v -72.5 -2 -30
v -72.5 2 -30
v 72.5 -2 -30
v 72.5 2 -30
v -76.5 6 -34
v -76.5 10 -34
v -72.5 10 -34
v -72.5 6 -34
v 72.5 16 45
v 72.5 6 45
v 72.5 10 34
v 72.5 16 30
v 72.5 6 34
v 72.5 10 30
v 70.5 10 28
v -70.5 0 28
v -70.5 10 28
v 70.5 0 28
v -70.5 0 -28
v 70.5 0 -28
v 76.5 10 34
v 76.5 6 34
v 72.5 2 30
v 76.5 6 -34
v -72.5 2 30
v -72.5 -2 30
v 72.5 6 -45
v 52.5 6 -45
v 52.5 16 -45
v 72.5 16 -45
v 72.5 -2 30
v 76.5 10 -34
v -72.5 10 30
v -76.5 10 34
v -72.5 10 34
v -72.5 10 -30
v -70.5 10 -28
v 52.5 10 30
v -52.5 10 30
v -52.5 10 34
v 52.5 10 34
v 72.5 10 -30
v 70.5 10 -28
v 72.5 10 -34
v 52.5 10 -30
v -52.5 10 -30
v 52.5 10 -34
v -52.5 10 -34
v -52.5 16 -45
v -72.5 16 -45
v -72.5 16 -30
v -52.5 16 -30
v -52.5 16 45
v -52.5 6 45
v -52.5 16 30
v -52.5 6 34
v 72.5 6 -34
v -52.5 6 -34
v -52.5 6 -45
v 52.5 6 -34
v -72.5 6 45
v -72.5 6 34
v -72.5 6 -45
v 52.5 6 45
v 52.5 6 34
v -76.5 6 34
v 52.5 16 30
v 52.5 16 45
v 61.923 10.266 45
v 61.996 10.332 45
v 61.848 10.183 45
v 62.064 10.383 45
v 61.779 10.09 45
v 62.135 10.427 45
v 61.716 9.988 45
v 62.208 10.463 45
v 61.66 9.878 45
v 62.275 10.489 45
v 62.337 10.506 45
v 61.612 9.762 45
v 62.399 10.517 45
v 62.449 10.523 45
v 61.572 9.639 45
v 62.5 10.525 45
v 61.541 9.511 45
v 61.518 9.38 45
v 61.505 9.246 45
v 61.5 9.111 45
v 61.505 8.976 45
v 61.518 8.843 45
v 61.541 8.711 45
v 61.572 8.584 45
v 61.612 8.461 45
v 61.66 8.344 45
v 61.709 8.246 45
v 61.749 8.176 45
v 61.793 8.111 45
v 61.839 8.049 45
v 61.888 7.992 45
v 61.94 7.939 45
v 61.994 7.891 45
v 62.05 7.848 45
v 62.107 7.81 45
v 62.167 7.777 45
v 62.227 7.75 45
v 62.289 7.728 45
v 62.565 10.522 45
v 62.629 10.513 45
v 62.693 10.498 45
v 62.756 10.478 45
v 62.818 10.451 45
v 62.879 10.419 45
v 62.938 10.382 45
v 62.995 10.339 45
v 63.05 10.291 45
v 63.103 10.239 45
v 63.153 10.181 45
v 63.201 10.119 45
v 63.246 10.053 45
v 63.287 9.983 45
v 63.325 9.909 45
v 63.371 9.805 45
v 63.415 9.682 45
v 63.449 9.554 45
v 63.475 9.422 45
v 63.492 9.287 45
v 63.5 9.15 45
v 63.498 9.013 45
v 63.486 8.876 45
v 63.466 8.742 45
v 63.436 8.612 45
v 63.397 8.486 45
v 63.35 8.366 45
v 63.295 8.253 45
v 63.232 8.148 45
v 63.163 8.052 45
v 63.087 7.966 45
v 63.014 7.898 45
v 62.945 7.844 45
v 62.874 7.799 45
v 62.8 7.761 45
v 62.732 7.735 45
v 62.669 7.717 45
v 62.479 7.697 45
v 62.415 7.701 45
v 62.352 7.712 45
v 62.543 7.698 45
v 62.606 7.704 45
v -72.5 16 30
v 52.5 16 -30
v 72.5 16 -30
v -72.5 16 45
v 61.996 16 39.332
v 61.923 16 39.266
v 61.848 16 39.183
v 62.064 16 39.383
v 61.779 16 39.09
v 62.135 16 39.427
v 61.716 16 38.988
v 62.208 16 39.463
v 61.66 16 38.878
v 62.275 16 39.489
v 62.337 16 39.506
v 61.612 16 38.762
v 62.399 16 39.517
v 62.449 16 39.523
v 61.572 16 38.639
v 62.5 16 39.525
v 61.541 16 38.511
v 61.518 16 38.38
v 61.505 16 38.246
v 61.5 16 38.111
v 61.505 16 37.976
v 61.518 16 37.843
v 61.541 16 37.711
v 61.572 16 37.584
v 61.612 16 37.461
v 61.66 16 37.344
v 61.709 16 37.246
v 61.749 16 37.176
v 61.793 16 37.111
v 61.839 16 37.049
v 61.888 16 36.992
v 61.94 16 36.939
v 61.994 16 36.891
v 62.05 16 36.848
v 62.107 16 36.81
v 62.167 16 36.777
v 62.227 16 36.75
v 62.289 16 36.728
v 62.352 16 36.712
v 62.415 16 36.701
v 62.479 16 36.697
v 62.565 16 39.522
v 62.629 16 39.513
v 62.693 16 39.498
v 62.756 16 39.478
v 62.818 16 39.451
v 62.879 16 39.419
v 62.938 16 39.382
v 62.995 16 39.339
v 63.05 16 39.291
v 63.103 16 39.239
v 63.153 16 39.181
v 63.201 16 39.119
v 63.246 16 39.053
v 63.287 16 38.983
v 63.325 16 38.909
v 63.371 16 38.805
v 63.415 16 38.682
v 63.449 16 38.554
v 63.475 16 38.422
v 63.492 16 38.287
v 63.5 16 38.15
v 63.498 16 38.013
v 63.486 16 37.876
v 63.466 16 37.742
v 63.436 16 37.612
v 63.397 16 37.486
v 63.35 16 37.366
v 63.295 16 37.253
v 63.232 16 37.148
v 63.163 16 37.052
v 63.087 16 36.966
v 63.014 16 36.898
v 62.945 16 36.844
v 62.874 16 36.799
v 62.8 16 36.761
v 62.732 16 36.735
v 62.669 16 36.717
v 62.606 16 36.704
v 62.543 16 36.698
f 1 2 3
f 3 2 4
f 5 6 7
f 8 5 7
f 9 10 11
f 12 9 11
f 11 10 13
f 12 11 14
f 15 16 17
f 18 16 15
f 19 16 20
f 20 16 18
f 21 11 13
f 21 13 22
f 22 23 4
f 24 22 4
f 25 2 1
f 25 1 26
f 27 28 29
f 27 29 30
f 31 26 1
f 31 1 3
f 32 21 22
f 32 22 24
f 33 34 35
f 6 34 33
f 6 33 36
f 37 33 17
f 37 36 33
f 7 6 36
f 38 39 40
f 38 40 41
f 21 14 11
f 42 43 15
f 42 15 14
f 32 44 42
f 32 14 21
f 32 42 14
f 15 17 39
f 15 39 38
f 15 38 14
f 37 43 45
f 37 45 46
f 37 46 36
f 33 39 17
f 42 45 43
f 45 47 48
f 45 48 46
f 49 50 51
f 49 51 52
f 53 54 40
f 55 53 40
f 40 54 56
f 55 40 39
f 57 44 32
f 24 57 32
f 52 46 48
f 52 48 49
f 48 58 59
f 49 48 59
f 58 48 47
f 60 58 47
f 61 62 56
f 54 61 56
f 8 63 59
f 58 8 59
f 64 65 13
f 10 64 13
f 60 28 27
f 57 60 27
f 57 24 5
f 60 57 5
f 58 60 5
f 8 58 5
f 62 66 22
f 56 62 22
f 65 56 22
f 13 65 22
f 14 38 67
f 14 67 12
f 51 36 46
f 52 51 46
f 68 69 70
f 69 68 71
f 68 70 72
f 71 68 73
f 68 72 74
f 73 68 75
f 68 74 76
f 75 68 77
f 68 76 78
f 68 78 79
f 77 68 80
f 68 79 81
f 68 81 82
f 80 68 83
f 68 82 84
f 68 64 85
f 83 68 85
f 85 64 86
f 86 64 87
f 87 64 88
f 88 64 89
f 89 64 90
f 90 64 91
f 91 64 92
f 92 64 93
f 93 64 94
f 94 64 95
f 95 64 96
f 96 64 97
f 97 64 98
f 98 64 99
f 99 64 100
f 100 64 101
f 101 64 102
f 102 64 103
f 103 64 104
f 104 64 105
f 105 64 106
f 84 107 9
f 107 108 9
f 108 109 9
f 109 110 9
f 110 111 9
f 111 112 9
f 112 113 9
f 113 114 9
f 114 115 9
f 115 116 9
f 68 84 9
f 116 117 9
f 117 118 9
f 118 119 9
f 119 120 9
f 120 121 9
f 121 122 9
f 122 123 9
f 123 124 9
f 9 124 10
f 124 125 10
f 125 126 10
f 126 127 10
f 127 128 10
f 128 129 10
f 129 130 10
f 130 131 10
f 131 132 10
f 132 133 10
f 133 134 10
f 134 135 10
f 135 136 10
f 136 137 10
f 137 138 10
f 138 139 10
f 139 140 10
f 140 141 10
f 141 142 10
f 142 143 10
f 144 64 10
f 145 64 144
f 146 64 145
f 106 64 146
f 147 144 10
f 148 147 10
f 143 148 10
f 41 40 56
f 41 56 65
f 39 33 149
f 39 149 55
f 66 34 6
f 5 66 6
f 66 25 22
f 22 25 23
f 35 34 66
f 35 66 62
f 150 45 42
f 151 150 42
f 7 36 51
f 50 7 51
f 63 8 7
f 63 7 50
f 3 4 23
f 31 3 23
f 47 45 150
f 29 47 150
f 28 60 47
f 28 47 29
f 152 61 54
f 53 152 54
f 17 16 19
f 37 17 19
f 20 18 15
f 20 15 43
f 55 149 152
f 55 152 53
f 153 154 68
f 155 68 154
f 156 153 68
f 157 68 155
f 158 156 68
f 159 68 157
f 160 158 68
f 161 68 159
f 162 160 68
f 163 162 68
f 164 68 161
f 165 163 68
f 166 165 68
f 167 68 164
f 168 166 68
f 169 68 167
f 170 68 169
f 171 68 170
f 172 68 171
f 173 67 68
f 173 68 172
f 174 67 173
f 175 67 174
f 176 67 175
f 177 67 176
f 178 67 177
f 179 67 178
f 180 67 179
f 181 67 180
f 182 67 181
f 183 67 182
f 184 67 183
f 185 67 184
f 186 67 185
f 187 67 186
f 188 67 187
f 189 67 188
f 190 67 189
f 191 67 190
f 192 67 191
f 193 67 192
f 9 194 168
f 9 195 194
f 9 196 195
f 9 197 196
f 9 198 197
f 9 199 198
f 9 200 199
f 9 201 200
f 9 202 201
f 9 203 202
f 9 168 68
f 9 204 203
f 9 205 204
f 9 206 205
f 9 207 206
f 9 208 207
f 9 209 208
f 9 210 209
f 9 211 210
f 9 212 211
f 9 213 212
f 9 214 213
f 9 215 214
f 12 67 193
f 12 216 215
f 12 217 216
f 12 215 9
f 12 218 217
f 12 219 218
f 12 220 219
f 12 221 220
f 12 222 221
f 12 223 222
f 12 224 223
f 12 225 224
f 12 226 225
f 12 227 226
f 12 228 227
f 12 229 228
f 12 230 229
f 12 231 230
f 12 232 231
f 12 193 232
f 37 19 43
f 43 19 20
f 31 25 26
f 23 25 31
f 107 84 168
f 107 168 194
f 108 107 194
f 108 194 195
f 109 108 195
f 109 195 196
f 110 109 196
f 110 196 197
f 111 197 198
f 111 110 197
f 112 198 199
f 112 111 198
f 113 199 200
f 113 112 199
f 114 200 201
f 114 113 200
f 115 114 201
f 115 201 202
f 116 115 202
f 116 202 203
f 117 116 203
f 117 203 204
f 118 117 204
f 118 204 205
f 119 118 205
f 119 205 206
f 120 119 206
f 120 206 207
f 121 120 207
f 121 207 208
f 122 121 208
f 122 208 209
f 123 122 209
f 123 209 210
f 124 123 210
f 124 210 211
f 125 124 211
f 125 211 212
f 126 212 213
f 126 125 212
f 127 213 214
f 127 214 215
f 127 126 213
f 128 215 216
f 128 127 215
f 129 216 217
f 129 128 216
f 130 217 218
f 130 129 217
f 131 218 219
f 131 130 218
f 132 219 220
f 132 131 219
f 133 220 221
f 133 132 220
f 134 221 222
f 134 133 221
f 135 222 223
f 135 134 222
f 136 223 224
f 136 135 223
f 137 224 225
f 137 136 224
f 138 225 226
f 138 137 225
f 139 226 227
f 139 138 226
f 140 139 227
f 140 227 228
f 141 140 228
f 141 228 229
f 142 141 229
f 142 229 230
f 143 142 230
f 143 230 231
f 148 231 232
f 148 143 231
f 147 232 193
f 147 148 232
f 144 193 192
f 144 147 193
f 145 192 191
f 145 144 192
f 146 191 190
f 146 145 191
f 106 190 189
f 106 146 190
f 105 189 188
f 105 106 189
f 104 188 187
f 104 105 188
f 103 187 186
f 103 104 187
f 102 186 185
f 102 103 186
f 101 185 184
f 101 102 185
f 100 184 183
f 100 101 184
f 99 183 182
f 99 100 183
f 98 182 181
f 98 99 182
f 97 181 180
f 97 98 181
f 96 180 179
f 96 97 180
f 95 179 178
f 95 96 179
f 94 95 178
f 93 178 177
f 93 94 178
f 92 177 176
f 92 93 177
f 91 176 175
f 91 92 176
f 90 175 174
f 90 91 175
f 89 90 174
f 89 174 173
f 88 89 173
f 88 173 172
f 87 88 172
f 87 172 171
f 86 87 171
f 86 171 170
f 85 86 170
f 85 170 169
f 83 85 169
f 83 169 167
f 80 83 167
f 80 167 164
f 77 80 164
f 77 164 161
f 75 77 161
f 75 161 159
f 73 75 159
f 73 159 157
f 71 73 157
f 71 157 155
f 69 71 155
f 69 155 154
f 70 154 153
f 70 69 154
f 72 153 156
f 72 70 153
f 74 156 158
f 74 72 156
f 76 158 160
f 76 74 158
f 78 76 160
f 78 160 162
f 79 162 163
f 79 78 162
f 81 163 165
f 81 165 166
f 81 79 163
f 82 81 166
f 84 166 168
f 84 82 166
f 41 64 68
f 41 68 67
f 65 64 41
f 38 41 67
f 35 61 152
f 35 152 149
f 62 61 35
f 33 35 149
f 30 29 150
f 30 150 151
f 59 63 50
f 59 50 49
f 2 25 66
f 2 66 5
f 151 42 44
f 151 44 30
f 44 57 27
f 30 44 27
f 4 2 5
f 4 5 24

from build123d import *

# Parameters (mm, degrees)
SKETCH1_W               = 145
SKETCH1_H               = 60
SKETCH1_W_2             = 141
SKETCH1_H_2             = 56
BOSS_EXTRUDE1_DEPTH     = 10
SKETCH2_W               = 145
SKETCH2_H               = 60
BOSS_EXTRUDE2_DEPTH     = 2
SKETCH3_W               = 153
SKETCH3_H               = 68
SKETCH3_W_2             = 145
SKETCH3_H_2             = 60
BOSS_EXTRUDE3_DEPTH     = 4
CHAMFER1_SIZE           = 4
BOSS_EXTRUDE4_START     = -4
SKETCH4_W               = 20
SKETCH4_H               = 15
BOSS_EXTRUDE4_DEPTH     = 10
CUT_EXTRUDE2_DEPTH      = 102.600935035
CUT_EXTRUDE2_DEPTH_BACK = 102.600935035
SKETCH6_R               = 1


with BuildPart() as part:
    # Sketch1 → Boss-Extrude1 (new body)
    with BuildSketch(Plane(origin=(0, 0, 0), x_dir=(1, 0, 0), z_dir=(0, 1, 0))):
        Rectangle(SKETCH1_W, SKETCH1_H)
        Rectangle(SKETCH1_W_2, SKETCH1_H_2, mode=Mode.SUBTRACT)
    extrude(amount=BOSS_EXTRUDE1_DEPTH)

    # Sketch2 → Boss-Extrude2 (add)
    with BuildSketch(Plane.XZ):
        Rectangle(SKETCH2_W, SKETCH2_H)
    extrude(amount=BOSS_EXTRUDE2_DEPTH)

    # Sketch3 → Boss-Extrude3 (add)
    with BuildSketch(Plane(origin=(0, 10, 0), x_dir=(1, 0, 0), z_dir=(0, 1, 0))):
        Rectangle(SKETCH3_W, SKETCH3_H)
        Rectangle(SKETCH3_W_2, SKETCH3_H_2, mode=Mode.SUBTRACT)
    extrude(amount=-BOSS_EXTRUDE3_DEPTH)

    # Chamfer1
    chamfer1_edges = [part.edges().sort_by_distance(p)[0] for p in [
        (-72.5, 6, 0),
        (0, 6, 30),
        (72.5, 6, 0),
        (0, 6, -30),
    ]]
    chamfer(chamfer1_edges, length=CHAMFER1_SIZE - 0.0001)  # a hair under: the kernel refuses the full size

    # Sketch4 → Boss-Extrude4 (add)
    with BuildSketch(Plane(origin=(0, 10, 0), x_dir=(1, 0, 0), z_dir=(0, 1, 0)).offset(BOSS_EXTRUDE4_START)):
        with Locations((-62.5, 37.5)):
            Rectangle(SKETCH4_W, SKETCH4_H)
        with Locations((-62.5, -37.5)):
            Rectangle(SKETCH4_W, SKETCH4_H)
        with Locations((62.5, -37.5)):
            Rectangle(SKETCH4_W, SKETCH4_H)
        with Locations((62.5, 37.5)):
            Rectangle(SKETCH4_W, SKETCH4_H)
    extrude(amount=BOSS_EXTRUDE4_DEPTH)

    # Sketch6 → Cut-Extrude2 (cut, two sides: drawn at the far end of the back side and taken through both)
    with BuildSketch(Plane(origin=(0, -14.5, 14.5), x_dir=(1, 0, 0), z_dir=(0, 0.7071067811865464, -0.7071067811865488)).offset(-CUT_EXTRUDE2_DEPTH_BACK)):
        with Locations(Location((62.5, -38.261881076, 0), (0, 0, 270))):
            Circle(SKETCH6_R)
    extrude(amount=CUT_EXTRUDE2_DEPTH + CUT_EXTRUDE2_DEPTH_BACK, mode=Mode.SUBTRACT)


solid = part.part
